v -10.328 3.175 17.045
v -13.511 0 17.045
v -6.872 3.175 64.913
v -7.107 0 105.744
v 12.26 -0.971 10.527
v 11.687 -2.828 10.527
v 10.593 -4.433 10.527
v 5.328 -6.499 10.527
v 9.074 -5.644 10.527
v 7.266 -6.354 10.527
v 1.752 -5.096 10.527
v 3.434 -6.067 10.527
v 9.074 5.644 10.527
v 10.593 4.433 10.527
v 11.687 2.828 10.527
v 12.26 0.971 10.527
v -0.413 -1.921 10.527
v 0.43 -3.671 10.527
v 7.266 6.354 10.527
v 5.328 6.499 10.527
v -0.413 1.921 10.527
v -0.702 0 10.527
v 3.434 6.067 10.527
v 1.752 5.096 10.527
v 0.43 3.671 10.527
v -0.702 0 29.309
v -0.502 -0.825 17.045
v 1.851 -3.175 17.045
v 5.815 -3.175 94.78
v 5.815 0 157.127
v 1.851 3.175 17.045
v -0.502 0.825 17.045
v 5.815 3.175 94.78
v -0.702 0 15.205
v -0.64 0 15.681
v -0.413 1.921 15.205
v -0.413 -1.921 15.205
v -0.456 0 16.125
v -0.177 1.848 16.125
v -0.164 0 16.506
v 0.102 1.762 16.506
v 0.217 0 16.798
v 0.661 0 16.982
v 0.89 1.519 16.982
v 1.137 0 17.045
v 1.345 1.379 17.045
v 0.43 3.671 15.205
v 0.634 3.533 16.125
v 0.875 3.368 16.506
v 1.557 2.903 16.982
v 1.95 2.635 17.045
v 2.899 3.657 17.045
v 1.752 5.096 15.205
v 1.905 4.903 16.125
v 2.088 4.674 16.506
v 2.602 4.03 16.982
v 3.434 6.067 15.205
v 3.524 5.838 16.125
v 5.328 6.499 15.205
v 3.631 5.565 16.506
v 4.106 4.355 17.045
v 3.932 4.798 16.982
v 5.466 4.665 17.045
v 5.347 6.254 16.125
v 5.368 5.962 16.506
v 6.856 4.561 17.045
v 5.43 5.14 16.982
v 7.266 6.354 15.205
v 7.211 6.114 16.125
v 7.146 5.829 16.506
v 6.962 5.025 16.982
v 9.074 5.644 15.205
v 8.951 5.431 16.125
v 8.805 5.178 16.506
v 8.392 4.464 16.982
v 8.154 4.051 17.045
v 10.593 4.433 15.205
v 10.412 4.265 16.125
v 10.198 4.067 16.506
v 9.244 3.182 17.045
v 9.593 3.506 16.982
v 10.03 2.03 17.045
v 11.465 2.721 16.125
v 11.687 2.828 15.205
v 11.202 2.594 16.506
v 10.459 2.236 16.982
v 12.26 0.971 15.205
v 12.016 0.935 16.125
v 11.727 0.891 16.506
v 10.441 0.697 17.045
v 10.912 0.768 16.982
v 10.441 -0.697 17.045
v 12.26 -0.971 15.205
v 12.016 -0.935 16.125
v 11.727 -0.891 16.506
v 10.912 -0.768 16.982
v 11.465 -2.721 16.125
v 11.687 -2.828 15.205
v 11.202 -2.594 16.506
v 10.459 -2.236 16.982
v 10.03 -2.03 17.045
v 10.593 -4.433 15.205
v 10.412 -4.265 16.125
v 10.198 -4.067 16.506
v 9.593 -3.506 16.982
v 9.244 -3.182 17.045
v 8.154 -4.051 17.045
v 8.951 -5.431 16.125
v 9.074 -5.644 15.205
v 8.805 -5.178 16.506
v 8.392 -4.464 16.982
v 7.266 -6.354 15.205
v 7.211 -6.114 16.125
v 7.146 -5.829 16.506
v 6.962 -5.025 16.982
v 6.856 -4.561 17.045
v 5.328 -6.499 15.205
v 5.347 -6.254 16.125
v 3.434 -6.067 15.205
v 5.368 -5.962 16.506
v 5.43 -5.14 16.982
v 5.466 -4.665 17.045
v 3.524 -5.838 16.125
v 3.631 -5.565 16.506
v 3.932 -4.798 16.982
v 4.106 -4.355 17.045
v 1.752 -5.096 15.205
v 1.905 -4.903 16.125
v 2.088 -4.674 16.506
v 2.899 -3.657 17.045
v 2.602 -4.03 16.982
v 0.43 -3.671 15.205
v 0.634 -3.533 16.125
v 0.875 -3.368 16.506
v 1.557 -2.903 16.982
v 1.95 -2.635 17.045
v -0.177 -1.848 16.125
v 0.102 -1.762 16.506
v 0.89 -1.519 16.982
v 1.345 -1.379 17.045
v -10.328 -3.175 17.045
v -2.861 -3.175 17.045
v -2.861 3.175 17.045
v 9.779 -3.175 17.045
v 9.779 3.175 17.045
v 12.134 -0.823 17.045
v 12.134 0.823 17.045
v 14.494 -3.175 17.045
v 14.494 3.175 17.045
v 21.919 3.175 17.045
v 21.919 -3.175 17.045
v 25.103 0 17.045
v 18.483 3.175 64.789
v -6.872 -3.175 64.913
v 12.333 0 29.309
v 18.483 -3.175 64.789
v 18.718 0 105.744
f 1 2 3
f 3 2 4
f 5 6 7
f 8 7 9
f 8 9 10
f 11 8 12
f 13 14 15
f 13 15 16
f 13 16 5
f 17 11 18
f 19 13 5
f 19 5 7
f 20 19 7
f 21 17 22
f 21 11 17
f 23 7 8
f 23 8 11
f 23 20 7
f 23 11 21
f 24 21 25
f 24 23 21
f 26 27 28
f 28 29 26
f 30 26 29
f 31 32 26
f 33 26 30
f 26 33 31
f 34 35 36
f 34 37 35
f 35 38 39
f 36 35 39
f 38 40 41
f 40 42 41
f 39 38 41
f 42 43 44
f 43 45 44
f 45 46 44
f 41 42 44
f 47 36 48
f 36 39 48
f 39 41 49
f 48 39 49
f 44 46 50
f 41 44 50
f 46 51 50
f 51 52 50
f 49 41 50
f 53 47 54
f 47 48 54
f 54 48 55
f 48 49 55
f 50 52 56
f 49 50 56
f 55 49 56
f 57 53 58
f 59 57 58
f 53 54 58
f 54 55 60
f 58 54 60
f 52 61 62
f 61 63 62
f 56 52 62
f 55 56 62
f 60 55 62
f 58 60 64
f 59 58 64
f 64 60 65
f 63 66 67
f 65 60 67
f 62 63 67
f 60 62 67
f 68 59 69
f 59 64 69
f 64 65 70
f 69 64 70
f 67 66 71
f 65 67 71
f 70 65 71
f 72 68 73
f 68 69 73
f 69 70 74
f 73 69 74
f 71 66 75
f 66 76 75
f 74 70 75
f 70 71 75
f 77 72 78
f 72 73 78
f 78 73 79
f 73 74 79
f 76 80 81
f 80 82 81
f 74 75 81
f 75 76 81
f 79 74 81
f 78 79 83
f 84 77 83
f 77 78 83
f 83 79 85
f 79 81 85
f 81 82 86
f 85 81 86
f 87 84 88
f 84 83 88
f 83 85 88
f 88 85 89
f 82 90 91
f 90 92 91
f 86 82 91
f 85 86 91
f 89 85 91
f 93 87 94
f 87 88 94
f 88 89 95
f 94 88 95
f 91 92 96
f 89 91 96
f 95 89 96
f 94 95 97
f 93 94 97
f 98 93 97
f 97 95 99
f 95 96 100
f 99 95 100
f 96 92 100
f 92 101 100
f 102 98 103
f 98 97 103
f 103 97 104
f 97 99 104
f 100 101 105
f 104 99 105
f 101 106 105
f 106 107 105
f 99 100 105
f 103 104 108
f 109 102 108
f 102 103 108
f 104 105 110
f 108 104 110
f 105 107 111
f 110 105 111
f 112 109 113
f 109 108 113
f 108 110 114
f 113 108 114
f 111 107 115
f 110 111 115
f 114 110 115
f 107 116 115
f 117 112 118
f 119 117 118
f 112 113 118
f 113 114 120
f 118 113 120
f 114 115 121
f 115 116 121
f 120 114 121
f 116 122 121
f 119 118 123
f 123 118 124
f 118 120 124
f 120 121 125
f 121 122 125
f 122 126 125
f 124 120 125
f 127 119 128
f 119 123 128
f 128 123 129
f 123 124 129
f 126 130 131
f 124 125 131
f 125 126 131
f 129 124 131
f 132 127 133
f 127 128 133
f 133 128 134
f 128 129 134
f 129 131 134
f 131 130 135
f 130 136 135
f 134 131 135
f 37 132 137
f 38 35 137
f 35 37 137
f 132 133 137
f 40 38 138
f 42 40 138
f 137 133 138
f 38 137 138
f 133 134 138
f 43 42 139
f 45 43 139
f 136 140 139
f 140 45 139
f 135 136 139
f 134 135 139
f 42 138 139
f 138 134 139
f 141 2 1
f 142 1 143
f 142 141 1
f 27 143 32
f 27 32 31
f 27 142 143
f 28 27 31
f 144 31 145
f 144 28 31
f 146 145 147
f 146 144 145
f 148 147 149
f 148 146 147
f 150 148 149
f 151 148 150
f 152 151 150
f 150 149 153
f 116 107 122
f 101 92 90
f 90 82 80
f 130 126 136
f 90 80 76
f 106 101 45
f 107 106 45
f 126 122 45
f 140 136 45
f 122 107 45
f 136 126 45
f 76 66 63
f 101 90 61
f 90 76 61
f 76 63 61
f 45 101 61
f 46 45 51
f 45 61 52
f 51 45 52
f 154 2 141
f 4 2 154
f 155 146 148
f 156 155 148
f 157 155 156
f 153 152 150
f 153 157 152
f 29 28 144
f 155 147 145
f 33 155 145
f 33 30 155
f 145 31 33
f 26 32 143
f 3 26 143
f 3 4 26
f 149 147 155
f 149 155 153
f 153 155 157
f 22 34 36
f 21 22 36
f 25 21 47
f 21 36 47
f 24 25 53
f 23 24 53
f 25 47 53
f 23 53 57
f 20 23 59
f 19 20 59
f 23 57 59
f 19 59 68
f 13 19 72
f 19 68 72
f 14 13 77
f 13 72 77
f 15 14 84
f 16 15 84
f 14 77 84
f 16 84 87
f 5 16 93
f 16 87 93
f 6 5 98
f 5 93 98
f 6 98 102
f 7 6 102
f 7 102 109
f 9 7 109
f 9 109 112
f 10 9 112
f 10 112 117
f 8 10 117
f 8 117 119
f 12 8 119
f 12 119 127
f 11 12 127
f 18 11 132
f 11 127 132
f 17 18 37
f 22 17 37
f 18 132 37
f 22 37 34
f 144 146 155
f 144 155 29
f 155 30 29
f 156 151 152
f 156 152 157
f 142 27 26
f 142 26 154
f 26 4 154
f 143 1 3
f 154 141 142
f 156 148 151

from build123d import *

# Parameters (mm, degrees)
F1_DEPTH     = 3.175
F0_W         = 6.517579814
F0_H         = 6.517579814
F3_R         = 1.8396307345
F4_T1_DEPTH  = 105.2601198415
F4_T3_DEPTH  = 105.2587122864
F4_T8_DEPTH  = 160.6437057027
F4_T13_DEPTH = 160.6437057027
F4_T18_DEPTH = 109.3610790882
F4_T23_DEPTH = 109.3627110349
F4_T28_DEPTH = 109.3610790882
F4_T33_DEPTH = 160.6437057027
F4_T38_DEPTH = 160.6437057027
F4_T43_DEPTH = 109.3627110349
F4_T49_DEPTH = 109.3627110349
F4_T53_DEPTH = 160.6437057027
F4_T60_DEPTH = 160.6437057027
F4_T64_DEPTH = 109.3610790882
F4_T71_DEPTH = 160.6437057027
F4_T75_DEPTH = 109.3610790882
F4_T82_DEPTH = 109.3627110349
F4_T86_DEPTH = 160.6437057027


# Not quite as in the source:
# - a fillet or chamfer that OpenCascade refuses, or shapes differently, is made with other operations: its cross-section is extruded or revolved along the edge and cut away or added


with BuildPart() as f1:
    # F0 (on Front) → F1 (new body, symmetric)
    with BuildSketch(Plane.XZ):
        Polygon((5.8152633182, 17.0447041894), (12.3328431322, 17.0447041894), (25.1026526093, 17.0447041894), (18.7177478708, 105.7437211275), (12.3328431322, 29.3092317879), (5.8152633182, 157.1265012026), (-0.7023164958, 29.3092317879), (-7.1067957186, 105.7437211275), (-13.5112749413, 17.0447041894), (-0.7023164958, 17.0447041894), align=None)
    extrude(amount=F1_DEPTH, both=True)

    # F4: chamfer of 3.175 on 12 edges, made by hand

    # F4_s2 → F4_t1 (cut)
    with BuildSketch(Plane(origin=(8.146753536, 0, 112.828694536), x_dir=(0, 1, 0), z_dir=(-0.0720171377, 0, -0.9974033948))):
        Polygon((0, -14.7037023029), (-3.175, -11.5287023029), (-3.175, -14.7037023029), align=None)
        Polygon((0, -14.7037023029), (3.175, -11.5287023029), (3.175, -14.7037023029), align=None)
    extrude(amount=F4_T1_DEPTH, mode=Mode.SUBTRACT)

    # F4_s4 → F4_t3 (cut)
    with BuildSketch(Plane(origin=(-0.5049778086, 0, 7.0151454149), x_dir=(0, 1, 0), z_dir=(-0.0717981628, 0, 0.9974191816))):
        Polygon((-3.175, -23.0866456679), (0, -26.2616456679), (-3.175, -26.2616456679), align=None)
        Polygon((0, -26.2616456679), (3.175, -23.0866456679), (3.175, -26.2616456679), align=None)
    extrude(amount=F4_T3_DEPTH, mode=Mode.SUBTRACT)


with BuildPart() as f2:
    # F0 (on Front) → F2 (revolve)
    with BuildSketch(Plane.XZ):
        with Locations((2.5564734112, 13.7859142824)):
            Rectangle(F0_W, F0_H)
    revolve(axis=Axis((5.8152633182, 0, 13.7859142824), (0, 0, -1)))

    # F3
    f3_edges = [f2.edges().sort_by_distance(p)[0] for p in [
        (12.332843, 0, 17.044704),
    ]]
    fillet(f3_edges, radius=F3_R)


with BuildPart() as f4_tool6:
    # F4_s7 → F4_t8 (new body)
    with BuildSketch(Plane(origin=(8.4222101757, 0, 165.1692710805), x_dir=(0, 1, 0), z_dir=(-0.0509252238, 0, -0.998702469))):
        Polygon((0, -2.193984407), (-3.175, 0.981015593), (-3.175, -2.193984407), align=None)
    extrude(amount=F4_T8_DEPTH)

    split(bisect_by=Plane(origin=(1.7412915039, 0, 0.1459035751), x_dir=(0, 1, 0), z_dir=(0.9965079584, 0, 0.0834978368)), keep=Keep.TOP)


with BuildPart() as f1_1:
    add(f1.part)

    # F4_t5: cut F4_tool6
    add(f4_tool6.part, mode=Mode.SUBTRACT)


with BuildPart() as f4_tool11:
    # F4_s12 → F4_t13 (new body)
    with BuildSketch(Plane(origin=(-0.2112311518, 0, 4.1424869054), x_dir=(0, 1, 0), z_dir=(-0.0509252238, 0, 0.998702469))):
        Polygon((0, -13.8094200745), (-3.175, -10.6344200745), (-3.175, -13.8094200745), align=None)
    extrude(amount=F4_T13_DEPTH)

    split(bisect_by=Plane(origin=(9.8160197033, 0, -0.8199747425), x_dir=(0, 1, 0), z_dir=(-0.996529161, 0, 0.0832444073)), keep=Keep.TOP)


with BuildPart() as f1_2:
    add(f1_1.part)

    # F4_t10: cut F4_tool11
    add(f4_tool11.part, mode=Mode.SUBTRACT)


with BuildPart() as f4_tool16:
    # F4_s17 → F4_t18 (new body)
    with BuildSketch(Plane(origin=(9.5814265353, 0, 114.7004496316), x_dir=(0, 1, 0), z_dir=(-0.0832444073, 0, -0.996529161))):
        Polygon((0, 9.8502081904), (-3.175, 13.0252081904), (-3.175, 9.8502081904), align=None)
    extrude(amount=F4_T18_DEPTH)

    split(bisect_by=Plane(origin=(13.7915019238, 0, 0.703247808), x_dir=(0, 1, 0), z_dir=(0.998702469, 0, 0.0509252238)), keep=Keep.TOP)


with BuildPart() as f1_3:
    add(f1_2.part)

    # F4_t15: cut F4_tool16
    add(f4_tool16.part, mode=Mode.SUBTRACT)


with BuildPart() as f4_tool21:
    # F4_s22 → F4_t23 (new body)
    with BuildSketch(Plane(origin=(-0.39830507, 0, 4.7535862896), x_dir=(0, 1, 0), z_dir=(-0.0834978368, 0, 0.9965079584))):
        Polygon((0, -1.7473934745), (-3.175, 1.4276065255), (-3.175, -1.7473934745), align=None)
    extrude(amount=F4_T23_DEPTH)

    split(bisect_by=Plane(origin=(-2.1911376442, 0, 0.111729147), x_dir=(0, 1, 0), z_dir=(-0.998702469, 0, 0.0509252238)), keep=Keep.TOP)


with BuildPart() as f1_4:
    add(f1_3.part)

    # F4_t20: cut F4_tool21
    add(f4_tool21.part, mode=Mode.SUBTRACT)


with BuildPart() as f4_tool26:
    # F4_s27 → F4_t28 (new body)
    with BuildSketch(Plane(origin=(9.5814265353, 0, 114.7004496316), x_dir=(0, 1, 0), z_dir=(-0.0832444073, 0, -0.996529161))):
        Polygon((0, 9.8502081904), (3.175, 13.0252081904), (3.175, 9.8502081904), align=None)
    extrude(amount=F4_T28_DEPTH)

    split(bisect_by=Plane(origin=(13.7915019238, 0, 0.703247808), x_dir=(0, 1, 0), z_dir=(0.998702469, 0, 0.0509252238)), keep=Keep.TOP)


with BuildPart() as f1_5:
    add(f1_4.part)

    # F4_t25: cut F4_tool26
    add(f4_tool26.part, mode=Mode.SUBTRACT)


with BuildPart() as f4_tool31:
    # F4_s32 → F4_t33 (new body)
    with BuildSketch(Plane(origin=(-0.2112311518, 0, 4.1424869054), x_dir=(0, 1, 0), z_dir=(-0.0509252238, 0, 0.998702469))):
        Polygon((0, -13.8094200745), (3.175, -10.6344200745), (3.175, -13.8094200745), align=None)
    extrude(amount=F4_T33_DEPTH)

    split(bisect_by=Plane(origin=(9.8160197033, 0, -0.8199747425), x_dir=(0, 1, 0), z_dir=(-0.996529161, 0, 0.0832444073)), keep=Keep.TOP)


with BuildPart() as f1_6:
    add(f1_5.part)

    # F4_t30: cut F4_tool31
    add(f4_tool31.part, mode=Mode.SUBTRACT)


with BuildPart() as f4_tool36:
    # F4_s37 → F4_t38 (new body)
    with BuildSketch(Plane(origin=(8.4222101757, 0, 165.1692710805), x_dir=(0, 1, 0), z_dir=(-0.0509252238, 0, -0.998702469))):
        Polygon((0, -2.193984407), (3.175, 0.981015593), (3.175, -2.193984407), align=None)
    extrude(amount=F4_T38_DEPTH)

    split(bisect_by=Plane(origin=(1.7412915039, 0, 0.1459035751), x_dir=(0, 1, 0), z_dir=(0.9965079584, 0, 0.0834978368)), keep=Keep.TOP)


with BuildPart() as f1_7:
    add(f1_6.part)

    # F4_t35: cut F4_tool36
    add(f4_tool36.part, mode=Mode.SUBTRACT)


with BuildPart() as f4_tool41:
    # F4_s42 → F4_t43 (new body)
    with BuildSketch(Plane(origin=(-0.39830507, 0, 4.7535862896), x_dir=(0, 1, 0), z_dir=(-0.0834978368, 0, 0.9965079584))):
        Polygon((0, -1.7473934745), (3.175, 1.4276065255), (3.175, -1.7473934745), align=None)
    extrude(amount=F4_T43_DEPTH)

    split(bisect_by=Plane(origin=(-2.1911376442, 0, 0.111729147), x_dir=(0, 1, 0), z_dir=(-0.998702469, 0, 0.0509252238)), keep=Keep.TOP)


with BuildPart() as f1_8:
    add(f1_7.part)

    # F4_t40: cut F4_tool41
    add(f4_tool41.part, mode=Mode.SUBTRACT)


with BuildPart() as f4_tool47:
    # F4_s48 → F4_t49 (new body)
    with BuildSketch(Plane(origin=(-0.39830507, 0, 4.7535862896), x_dir=(0, 1, 0), z_dir=(-0.0834978368, 0, 0.9965079584))):
        Polygon((0, -1.7473934745), (-3.175, 1.4276065255), (-3.175, -1.7473934745), align=None)
    extrude(amount=F4_T49_DEPTH)

    split(bisect_by=Plane(origin=(-2.1911376442, 0, 0.111729147), x_dir=(0, 1, 0), z_dir=(0.998702469, 0, -0.0509252238)), keep=Keep.TOP)


with BuildPart() as f4_tool51:
    # F4_s52 → F4_t53 (new body)
    with BuildSketch(Plane(origin=(8.4222101757, 0, 165.1692710805), x_dir=(0, 1, 0), z_dir=(-0.0509252238, 0, -0.998702469))):
        Polygon((0, -2.193984407), (-3.175, 0.981015593), (-3.175, -2.193984407), align=None)
    extrude(amount=F4_T53_DEPTH)

    split(bisect_by=Plane(origin=(1.7412915039, 0, 0.1459035751), x_dir=(0, 1, 0), z_dir=(-0.9965079584, 0, -0.0834978368)), keep=Keep.TOP)


with BuildPart() as f4_tool47_1:
    add(f4_tool47.part)

    # F4_t55: intersect F4_tool51
    add(f4_tool51.part, mode=Mode.INTERSECT)


with BuildPart() as f1_9:
    add(f1_8.part)

    # F4_t45: cut F4_tool47
    add(f4_tool47_1.part, mode=Mode.SUBTRACT)


with BuildPart() as f4_tool58:
    # F4_s59 → F4_t60 (new body)
    with BuildSketch(Plane(origin=(-0.2112311518, 0, 4.1424869054), x_dir=(0, 1, 0), z_dir=(-0.0509252238, 0, 0.998702469))):
        Polygon((0, -13.8094200745), (-3.175, -10.6344200745), (-3.175, -13.8094200745), align=None)
    extrude(amount=F4_T60_DEPTH)

    split(bisect_by=Plane(origin=(9.8160197033, 0, -0.8199747425), x_dir=(0, 1, 0), z_dir=(0.996529161, 0, -0.0832444073)), keep=Keep.TOP)


with BuildPart() as f4_tool62:
    # F4_s63 → F4_t64 (new body)
    with BuildSketch(Plane(origin=(9.5814265353, 0, 114.7004496316), x_dir=(0, 1, 0), z_dir=(-0.0832444073, 0, -0.996529161))):
        Polygon((0, 9.8502081904), (-3.175, 13.0252081904), (-3.175, 9.8502081904), align=None)
    extrude(amount=F4_T64_DEPTH)

    split(bisect_by=Plane(origin=(13.7915019238, 0, 0.703247808), x_dir=(0, 1, 0), z_dir=(-0.998702469, 0, -0.0509252238)), keep=Keep.TOP)


with BuildPart() as f4_tool58_1:
    add(f4_tool58.part)

    # F4_t66: intersect F4_tool62
    add(f4_tool62.part, mode=Mode.INTERSECT)


with BuildPart() as f1_10:
    add(f1_9.part)

    # F4_t56: cut F4_tool58
    add(f4_tool58_1.part, mode=Mode.SUBTRACT)


with BuildPart() as f4_tool69:
    # F4_s70 → F4_t71 (new body)
    with BuildSketch(Plane(origin=(-0.2112311518, 0, 4.1424869054), x_dir=(0, 1, 0), z_dir=(-0.0509252238, 0, 0.998702469))):
        Polygon((0, -13.8094200745), (3.175, -10.6344200745), (3.175, -13.8094200745), align=None)
    extrude(amount=F4_T71_DEPTH)

    split(bisect_by=Plane(origin=(9.8160197033, 0, -0.8199747425), x_dir=(0, 1, 0), z_dir=(0.996529161, 0, -0.0832444073)), keep=Keep.TOP)


with BuildPart() as f4_tool73:
    # F4_s74 → F4_t75 (new body)
    with BuildSketch(Plane(origin=(9.5814265353, 0, 114.7004496316), x_dir=(0, 1, 0), z_dir=(-0.0832444073, 0, -0.996529161))):
        Polygon((0, 9.8502081904), (3.175, 13.0252081904), (3.175, 9.8502081904), align=None)
    extrude(amount=F4_T75_DEPTH)

    split(bisect_by=Plane(origin=(13.7915019238, 0, 0.703247808), x_dir=(0, 1, 0), z_dir=(-0.998702469, 0, -0.0509252238)), keep=Keep.TOP)


with BuildPart() as f4_tool69_1:
    add(f4_tool69.part)

    # F4_t77: intersect F4_tool73
    add(f4_tool73.part, mode=Mode.INTERSECT)


with BuildPart() as f1_11:
    add(f1_10.part)

    # F4_t67: cut F4_tool69
    add(f4_tool69_1.part, mode=Mode.SUBTRACT)


with BuildPart() as f4_tool80:
    # F4_s81 → F4_t82 (new body)
    with BuildSketch(Plane(origin=(-0.39830507, 0, 4.7535862896), x_dir=(0, 1, 0), z_dir=(-0.0834978368, 0, 0.9965079584))):
        Polygon((0, -1.7473934745), (3.175, 1.4276065255), (3.175, -1.7473934745), align=None)
    extrude(amount=F4_T82_DEPTH)

    split(bisect_by=Plane(origin=(-2.1911376442, 0, 0.111729147), x_dir=(0, 1, 0), z_dir=(0.998702469, 0, -0.0509252238)), keep=Keep.TOP)


with BuildPart() as f4_tool84:
    # F4_s85 → F4_t86 (new body)
    with BuildSketch(Plane(origin=(8.4222101757, 0, 165.1692710805), x_dir=(0, 1, 0), z_dir=(-0.0509252238, 0, -0.998702469))):
        Polygon((0, -2.193984407), (3.175, 0.981015593), (3.175, -2.193984407), align=None)
    extrude(amount=F4_T86_DEPTH)

    split(bisect_by=Plane(origin=(1.7412915039, 0, 0.1459035751), x_dir=(0, 1, 0), z_dir=(-0.9965079584, 0, -0.0834978368)), keep=Keep.TOP)


with BuildPart() as f4_tool80_1:
    add(f4_tool80.part)

    # F4_t88: intersect F4_tool84
    add(f4_tool84.part, mode=Mode.INTERSECT)


with BuildPart() as f1_12:
    add(f1_11.part)

    # F4_t78: cut F4_tool80
    add(f4_tool80_1.part, mode=Mode.SUBTRACT)


solid = Compound([f2.part, f1_12.part])
